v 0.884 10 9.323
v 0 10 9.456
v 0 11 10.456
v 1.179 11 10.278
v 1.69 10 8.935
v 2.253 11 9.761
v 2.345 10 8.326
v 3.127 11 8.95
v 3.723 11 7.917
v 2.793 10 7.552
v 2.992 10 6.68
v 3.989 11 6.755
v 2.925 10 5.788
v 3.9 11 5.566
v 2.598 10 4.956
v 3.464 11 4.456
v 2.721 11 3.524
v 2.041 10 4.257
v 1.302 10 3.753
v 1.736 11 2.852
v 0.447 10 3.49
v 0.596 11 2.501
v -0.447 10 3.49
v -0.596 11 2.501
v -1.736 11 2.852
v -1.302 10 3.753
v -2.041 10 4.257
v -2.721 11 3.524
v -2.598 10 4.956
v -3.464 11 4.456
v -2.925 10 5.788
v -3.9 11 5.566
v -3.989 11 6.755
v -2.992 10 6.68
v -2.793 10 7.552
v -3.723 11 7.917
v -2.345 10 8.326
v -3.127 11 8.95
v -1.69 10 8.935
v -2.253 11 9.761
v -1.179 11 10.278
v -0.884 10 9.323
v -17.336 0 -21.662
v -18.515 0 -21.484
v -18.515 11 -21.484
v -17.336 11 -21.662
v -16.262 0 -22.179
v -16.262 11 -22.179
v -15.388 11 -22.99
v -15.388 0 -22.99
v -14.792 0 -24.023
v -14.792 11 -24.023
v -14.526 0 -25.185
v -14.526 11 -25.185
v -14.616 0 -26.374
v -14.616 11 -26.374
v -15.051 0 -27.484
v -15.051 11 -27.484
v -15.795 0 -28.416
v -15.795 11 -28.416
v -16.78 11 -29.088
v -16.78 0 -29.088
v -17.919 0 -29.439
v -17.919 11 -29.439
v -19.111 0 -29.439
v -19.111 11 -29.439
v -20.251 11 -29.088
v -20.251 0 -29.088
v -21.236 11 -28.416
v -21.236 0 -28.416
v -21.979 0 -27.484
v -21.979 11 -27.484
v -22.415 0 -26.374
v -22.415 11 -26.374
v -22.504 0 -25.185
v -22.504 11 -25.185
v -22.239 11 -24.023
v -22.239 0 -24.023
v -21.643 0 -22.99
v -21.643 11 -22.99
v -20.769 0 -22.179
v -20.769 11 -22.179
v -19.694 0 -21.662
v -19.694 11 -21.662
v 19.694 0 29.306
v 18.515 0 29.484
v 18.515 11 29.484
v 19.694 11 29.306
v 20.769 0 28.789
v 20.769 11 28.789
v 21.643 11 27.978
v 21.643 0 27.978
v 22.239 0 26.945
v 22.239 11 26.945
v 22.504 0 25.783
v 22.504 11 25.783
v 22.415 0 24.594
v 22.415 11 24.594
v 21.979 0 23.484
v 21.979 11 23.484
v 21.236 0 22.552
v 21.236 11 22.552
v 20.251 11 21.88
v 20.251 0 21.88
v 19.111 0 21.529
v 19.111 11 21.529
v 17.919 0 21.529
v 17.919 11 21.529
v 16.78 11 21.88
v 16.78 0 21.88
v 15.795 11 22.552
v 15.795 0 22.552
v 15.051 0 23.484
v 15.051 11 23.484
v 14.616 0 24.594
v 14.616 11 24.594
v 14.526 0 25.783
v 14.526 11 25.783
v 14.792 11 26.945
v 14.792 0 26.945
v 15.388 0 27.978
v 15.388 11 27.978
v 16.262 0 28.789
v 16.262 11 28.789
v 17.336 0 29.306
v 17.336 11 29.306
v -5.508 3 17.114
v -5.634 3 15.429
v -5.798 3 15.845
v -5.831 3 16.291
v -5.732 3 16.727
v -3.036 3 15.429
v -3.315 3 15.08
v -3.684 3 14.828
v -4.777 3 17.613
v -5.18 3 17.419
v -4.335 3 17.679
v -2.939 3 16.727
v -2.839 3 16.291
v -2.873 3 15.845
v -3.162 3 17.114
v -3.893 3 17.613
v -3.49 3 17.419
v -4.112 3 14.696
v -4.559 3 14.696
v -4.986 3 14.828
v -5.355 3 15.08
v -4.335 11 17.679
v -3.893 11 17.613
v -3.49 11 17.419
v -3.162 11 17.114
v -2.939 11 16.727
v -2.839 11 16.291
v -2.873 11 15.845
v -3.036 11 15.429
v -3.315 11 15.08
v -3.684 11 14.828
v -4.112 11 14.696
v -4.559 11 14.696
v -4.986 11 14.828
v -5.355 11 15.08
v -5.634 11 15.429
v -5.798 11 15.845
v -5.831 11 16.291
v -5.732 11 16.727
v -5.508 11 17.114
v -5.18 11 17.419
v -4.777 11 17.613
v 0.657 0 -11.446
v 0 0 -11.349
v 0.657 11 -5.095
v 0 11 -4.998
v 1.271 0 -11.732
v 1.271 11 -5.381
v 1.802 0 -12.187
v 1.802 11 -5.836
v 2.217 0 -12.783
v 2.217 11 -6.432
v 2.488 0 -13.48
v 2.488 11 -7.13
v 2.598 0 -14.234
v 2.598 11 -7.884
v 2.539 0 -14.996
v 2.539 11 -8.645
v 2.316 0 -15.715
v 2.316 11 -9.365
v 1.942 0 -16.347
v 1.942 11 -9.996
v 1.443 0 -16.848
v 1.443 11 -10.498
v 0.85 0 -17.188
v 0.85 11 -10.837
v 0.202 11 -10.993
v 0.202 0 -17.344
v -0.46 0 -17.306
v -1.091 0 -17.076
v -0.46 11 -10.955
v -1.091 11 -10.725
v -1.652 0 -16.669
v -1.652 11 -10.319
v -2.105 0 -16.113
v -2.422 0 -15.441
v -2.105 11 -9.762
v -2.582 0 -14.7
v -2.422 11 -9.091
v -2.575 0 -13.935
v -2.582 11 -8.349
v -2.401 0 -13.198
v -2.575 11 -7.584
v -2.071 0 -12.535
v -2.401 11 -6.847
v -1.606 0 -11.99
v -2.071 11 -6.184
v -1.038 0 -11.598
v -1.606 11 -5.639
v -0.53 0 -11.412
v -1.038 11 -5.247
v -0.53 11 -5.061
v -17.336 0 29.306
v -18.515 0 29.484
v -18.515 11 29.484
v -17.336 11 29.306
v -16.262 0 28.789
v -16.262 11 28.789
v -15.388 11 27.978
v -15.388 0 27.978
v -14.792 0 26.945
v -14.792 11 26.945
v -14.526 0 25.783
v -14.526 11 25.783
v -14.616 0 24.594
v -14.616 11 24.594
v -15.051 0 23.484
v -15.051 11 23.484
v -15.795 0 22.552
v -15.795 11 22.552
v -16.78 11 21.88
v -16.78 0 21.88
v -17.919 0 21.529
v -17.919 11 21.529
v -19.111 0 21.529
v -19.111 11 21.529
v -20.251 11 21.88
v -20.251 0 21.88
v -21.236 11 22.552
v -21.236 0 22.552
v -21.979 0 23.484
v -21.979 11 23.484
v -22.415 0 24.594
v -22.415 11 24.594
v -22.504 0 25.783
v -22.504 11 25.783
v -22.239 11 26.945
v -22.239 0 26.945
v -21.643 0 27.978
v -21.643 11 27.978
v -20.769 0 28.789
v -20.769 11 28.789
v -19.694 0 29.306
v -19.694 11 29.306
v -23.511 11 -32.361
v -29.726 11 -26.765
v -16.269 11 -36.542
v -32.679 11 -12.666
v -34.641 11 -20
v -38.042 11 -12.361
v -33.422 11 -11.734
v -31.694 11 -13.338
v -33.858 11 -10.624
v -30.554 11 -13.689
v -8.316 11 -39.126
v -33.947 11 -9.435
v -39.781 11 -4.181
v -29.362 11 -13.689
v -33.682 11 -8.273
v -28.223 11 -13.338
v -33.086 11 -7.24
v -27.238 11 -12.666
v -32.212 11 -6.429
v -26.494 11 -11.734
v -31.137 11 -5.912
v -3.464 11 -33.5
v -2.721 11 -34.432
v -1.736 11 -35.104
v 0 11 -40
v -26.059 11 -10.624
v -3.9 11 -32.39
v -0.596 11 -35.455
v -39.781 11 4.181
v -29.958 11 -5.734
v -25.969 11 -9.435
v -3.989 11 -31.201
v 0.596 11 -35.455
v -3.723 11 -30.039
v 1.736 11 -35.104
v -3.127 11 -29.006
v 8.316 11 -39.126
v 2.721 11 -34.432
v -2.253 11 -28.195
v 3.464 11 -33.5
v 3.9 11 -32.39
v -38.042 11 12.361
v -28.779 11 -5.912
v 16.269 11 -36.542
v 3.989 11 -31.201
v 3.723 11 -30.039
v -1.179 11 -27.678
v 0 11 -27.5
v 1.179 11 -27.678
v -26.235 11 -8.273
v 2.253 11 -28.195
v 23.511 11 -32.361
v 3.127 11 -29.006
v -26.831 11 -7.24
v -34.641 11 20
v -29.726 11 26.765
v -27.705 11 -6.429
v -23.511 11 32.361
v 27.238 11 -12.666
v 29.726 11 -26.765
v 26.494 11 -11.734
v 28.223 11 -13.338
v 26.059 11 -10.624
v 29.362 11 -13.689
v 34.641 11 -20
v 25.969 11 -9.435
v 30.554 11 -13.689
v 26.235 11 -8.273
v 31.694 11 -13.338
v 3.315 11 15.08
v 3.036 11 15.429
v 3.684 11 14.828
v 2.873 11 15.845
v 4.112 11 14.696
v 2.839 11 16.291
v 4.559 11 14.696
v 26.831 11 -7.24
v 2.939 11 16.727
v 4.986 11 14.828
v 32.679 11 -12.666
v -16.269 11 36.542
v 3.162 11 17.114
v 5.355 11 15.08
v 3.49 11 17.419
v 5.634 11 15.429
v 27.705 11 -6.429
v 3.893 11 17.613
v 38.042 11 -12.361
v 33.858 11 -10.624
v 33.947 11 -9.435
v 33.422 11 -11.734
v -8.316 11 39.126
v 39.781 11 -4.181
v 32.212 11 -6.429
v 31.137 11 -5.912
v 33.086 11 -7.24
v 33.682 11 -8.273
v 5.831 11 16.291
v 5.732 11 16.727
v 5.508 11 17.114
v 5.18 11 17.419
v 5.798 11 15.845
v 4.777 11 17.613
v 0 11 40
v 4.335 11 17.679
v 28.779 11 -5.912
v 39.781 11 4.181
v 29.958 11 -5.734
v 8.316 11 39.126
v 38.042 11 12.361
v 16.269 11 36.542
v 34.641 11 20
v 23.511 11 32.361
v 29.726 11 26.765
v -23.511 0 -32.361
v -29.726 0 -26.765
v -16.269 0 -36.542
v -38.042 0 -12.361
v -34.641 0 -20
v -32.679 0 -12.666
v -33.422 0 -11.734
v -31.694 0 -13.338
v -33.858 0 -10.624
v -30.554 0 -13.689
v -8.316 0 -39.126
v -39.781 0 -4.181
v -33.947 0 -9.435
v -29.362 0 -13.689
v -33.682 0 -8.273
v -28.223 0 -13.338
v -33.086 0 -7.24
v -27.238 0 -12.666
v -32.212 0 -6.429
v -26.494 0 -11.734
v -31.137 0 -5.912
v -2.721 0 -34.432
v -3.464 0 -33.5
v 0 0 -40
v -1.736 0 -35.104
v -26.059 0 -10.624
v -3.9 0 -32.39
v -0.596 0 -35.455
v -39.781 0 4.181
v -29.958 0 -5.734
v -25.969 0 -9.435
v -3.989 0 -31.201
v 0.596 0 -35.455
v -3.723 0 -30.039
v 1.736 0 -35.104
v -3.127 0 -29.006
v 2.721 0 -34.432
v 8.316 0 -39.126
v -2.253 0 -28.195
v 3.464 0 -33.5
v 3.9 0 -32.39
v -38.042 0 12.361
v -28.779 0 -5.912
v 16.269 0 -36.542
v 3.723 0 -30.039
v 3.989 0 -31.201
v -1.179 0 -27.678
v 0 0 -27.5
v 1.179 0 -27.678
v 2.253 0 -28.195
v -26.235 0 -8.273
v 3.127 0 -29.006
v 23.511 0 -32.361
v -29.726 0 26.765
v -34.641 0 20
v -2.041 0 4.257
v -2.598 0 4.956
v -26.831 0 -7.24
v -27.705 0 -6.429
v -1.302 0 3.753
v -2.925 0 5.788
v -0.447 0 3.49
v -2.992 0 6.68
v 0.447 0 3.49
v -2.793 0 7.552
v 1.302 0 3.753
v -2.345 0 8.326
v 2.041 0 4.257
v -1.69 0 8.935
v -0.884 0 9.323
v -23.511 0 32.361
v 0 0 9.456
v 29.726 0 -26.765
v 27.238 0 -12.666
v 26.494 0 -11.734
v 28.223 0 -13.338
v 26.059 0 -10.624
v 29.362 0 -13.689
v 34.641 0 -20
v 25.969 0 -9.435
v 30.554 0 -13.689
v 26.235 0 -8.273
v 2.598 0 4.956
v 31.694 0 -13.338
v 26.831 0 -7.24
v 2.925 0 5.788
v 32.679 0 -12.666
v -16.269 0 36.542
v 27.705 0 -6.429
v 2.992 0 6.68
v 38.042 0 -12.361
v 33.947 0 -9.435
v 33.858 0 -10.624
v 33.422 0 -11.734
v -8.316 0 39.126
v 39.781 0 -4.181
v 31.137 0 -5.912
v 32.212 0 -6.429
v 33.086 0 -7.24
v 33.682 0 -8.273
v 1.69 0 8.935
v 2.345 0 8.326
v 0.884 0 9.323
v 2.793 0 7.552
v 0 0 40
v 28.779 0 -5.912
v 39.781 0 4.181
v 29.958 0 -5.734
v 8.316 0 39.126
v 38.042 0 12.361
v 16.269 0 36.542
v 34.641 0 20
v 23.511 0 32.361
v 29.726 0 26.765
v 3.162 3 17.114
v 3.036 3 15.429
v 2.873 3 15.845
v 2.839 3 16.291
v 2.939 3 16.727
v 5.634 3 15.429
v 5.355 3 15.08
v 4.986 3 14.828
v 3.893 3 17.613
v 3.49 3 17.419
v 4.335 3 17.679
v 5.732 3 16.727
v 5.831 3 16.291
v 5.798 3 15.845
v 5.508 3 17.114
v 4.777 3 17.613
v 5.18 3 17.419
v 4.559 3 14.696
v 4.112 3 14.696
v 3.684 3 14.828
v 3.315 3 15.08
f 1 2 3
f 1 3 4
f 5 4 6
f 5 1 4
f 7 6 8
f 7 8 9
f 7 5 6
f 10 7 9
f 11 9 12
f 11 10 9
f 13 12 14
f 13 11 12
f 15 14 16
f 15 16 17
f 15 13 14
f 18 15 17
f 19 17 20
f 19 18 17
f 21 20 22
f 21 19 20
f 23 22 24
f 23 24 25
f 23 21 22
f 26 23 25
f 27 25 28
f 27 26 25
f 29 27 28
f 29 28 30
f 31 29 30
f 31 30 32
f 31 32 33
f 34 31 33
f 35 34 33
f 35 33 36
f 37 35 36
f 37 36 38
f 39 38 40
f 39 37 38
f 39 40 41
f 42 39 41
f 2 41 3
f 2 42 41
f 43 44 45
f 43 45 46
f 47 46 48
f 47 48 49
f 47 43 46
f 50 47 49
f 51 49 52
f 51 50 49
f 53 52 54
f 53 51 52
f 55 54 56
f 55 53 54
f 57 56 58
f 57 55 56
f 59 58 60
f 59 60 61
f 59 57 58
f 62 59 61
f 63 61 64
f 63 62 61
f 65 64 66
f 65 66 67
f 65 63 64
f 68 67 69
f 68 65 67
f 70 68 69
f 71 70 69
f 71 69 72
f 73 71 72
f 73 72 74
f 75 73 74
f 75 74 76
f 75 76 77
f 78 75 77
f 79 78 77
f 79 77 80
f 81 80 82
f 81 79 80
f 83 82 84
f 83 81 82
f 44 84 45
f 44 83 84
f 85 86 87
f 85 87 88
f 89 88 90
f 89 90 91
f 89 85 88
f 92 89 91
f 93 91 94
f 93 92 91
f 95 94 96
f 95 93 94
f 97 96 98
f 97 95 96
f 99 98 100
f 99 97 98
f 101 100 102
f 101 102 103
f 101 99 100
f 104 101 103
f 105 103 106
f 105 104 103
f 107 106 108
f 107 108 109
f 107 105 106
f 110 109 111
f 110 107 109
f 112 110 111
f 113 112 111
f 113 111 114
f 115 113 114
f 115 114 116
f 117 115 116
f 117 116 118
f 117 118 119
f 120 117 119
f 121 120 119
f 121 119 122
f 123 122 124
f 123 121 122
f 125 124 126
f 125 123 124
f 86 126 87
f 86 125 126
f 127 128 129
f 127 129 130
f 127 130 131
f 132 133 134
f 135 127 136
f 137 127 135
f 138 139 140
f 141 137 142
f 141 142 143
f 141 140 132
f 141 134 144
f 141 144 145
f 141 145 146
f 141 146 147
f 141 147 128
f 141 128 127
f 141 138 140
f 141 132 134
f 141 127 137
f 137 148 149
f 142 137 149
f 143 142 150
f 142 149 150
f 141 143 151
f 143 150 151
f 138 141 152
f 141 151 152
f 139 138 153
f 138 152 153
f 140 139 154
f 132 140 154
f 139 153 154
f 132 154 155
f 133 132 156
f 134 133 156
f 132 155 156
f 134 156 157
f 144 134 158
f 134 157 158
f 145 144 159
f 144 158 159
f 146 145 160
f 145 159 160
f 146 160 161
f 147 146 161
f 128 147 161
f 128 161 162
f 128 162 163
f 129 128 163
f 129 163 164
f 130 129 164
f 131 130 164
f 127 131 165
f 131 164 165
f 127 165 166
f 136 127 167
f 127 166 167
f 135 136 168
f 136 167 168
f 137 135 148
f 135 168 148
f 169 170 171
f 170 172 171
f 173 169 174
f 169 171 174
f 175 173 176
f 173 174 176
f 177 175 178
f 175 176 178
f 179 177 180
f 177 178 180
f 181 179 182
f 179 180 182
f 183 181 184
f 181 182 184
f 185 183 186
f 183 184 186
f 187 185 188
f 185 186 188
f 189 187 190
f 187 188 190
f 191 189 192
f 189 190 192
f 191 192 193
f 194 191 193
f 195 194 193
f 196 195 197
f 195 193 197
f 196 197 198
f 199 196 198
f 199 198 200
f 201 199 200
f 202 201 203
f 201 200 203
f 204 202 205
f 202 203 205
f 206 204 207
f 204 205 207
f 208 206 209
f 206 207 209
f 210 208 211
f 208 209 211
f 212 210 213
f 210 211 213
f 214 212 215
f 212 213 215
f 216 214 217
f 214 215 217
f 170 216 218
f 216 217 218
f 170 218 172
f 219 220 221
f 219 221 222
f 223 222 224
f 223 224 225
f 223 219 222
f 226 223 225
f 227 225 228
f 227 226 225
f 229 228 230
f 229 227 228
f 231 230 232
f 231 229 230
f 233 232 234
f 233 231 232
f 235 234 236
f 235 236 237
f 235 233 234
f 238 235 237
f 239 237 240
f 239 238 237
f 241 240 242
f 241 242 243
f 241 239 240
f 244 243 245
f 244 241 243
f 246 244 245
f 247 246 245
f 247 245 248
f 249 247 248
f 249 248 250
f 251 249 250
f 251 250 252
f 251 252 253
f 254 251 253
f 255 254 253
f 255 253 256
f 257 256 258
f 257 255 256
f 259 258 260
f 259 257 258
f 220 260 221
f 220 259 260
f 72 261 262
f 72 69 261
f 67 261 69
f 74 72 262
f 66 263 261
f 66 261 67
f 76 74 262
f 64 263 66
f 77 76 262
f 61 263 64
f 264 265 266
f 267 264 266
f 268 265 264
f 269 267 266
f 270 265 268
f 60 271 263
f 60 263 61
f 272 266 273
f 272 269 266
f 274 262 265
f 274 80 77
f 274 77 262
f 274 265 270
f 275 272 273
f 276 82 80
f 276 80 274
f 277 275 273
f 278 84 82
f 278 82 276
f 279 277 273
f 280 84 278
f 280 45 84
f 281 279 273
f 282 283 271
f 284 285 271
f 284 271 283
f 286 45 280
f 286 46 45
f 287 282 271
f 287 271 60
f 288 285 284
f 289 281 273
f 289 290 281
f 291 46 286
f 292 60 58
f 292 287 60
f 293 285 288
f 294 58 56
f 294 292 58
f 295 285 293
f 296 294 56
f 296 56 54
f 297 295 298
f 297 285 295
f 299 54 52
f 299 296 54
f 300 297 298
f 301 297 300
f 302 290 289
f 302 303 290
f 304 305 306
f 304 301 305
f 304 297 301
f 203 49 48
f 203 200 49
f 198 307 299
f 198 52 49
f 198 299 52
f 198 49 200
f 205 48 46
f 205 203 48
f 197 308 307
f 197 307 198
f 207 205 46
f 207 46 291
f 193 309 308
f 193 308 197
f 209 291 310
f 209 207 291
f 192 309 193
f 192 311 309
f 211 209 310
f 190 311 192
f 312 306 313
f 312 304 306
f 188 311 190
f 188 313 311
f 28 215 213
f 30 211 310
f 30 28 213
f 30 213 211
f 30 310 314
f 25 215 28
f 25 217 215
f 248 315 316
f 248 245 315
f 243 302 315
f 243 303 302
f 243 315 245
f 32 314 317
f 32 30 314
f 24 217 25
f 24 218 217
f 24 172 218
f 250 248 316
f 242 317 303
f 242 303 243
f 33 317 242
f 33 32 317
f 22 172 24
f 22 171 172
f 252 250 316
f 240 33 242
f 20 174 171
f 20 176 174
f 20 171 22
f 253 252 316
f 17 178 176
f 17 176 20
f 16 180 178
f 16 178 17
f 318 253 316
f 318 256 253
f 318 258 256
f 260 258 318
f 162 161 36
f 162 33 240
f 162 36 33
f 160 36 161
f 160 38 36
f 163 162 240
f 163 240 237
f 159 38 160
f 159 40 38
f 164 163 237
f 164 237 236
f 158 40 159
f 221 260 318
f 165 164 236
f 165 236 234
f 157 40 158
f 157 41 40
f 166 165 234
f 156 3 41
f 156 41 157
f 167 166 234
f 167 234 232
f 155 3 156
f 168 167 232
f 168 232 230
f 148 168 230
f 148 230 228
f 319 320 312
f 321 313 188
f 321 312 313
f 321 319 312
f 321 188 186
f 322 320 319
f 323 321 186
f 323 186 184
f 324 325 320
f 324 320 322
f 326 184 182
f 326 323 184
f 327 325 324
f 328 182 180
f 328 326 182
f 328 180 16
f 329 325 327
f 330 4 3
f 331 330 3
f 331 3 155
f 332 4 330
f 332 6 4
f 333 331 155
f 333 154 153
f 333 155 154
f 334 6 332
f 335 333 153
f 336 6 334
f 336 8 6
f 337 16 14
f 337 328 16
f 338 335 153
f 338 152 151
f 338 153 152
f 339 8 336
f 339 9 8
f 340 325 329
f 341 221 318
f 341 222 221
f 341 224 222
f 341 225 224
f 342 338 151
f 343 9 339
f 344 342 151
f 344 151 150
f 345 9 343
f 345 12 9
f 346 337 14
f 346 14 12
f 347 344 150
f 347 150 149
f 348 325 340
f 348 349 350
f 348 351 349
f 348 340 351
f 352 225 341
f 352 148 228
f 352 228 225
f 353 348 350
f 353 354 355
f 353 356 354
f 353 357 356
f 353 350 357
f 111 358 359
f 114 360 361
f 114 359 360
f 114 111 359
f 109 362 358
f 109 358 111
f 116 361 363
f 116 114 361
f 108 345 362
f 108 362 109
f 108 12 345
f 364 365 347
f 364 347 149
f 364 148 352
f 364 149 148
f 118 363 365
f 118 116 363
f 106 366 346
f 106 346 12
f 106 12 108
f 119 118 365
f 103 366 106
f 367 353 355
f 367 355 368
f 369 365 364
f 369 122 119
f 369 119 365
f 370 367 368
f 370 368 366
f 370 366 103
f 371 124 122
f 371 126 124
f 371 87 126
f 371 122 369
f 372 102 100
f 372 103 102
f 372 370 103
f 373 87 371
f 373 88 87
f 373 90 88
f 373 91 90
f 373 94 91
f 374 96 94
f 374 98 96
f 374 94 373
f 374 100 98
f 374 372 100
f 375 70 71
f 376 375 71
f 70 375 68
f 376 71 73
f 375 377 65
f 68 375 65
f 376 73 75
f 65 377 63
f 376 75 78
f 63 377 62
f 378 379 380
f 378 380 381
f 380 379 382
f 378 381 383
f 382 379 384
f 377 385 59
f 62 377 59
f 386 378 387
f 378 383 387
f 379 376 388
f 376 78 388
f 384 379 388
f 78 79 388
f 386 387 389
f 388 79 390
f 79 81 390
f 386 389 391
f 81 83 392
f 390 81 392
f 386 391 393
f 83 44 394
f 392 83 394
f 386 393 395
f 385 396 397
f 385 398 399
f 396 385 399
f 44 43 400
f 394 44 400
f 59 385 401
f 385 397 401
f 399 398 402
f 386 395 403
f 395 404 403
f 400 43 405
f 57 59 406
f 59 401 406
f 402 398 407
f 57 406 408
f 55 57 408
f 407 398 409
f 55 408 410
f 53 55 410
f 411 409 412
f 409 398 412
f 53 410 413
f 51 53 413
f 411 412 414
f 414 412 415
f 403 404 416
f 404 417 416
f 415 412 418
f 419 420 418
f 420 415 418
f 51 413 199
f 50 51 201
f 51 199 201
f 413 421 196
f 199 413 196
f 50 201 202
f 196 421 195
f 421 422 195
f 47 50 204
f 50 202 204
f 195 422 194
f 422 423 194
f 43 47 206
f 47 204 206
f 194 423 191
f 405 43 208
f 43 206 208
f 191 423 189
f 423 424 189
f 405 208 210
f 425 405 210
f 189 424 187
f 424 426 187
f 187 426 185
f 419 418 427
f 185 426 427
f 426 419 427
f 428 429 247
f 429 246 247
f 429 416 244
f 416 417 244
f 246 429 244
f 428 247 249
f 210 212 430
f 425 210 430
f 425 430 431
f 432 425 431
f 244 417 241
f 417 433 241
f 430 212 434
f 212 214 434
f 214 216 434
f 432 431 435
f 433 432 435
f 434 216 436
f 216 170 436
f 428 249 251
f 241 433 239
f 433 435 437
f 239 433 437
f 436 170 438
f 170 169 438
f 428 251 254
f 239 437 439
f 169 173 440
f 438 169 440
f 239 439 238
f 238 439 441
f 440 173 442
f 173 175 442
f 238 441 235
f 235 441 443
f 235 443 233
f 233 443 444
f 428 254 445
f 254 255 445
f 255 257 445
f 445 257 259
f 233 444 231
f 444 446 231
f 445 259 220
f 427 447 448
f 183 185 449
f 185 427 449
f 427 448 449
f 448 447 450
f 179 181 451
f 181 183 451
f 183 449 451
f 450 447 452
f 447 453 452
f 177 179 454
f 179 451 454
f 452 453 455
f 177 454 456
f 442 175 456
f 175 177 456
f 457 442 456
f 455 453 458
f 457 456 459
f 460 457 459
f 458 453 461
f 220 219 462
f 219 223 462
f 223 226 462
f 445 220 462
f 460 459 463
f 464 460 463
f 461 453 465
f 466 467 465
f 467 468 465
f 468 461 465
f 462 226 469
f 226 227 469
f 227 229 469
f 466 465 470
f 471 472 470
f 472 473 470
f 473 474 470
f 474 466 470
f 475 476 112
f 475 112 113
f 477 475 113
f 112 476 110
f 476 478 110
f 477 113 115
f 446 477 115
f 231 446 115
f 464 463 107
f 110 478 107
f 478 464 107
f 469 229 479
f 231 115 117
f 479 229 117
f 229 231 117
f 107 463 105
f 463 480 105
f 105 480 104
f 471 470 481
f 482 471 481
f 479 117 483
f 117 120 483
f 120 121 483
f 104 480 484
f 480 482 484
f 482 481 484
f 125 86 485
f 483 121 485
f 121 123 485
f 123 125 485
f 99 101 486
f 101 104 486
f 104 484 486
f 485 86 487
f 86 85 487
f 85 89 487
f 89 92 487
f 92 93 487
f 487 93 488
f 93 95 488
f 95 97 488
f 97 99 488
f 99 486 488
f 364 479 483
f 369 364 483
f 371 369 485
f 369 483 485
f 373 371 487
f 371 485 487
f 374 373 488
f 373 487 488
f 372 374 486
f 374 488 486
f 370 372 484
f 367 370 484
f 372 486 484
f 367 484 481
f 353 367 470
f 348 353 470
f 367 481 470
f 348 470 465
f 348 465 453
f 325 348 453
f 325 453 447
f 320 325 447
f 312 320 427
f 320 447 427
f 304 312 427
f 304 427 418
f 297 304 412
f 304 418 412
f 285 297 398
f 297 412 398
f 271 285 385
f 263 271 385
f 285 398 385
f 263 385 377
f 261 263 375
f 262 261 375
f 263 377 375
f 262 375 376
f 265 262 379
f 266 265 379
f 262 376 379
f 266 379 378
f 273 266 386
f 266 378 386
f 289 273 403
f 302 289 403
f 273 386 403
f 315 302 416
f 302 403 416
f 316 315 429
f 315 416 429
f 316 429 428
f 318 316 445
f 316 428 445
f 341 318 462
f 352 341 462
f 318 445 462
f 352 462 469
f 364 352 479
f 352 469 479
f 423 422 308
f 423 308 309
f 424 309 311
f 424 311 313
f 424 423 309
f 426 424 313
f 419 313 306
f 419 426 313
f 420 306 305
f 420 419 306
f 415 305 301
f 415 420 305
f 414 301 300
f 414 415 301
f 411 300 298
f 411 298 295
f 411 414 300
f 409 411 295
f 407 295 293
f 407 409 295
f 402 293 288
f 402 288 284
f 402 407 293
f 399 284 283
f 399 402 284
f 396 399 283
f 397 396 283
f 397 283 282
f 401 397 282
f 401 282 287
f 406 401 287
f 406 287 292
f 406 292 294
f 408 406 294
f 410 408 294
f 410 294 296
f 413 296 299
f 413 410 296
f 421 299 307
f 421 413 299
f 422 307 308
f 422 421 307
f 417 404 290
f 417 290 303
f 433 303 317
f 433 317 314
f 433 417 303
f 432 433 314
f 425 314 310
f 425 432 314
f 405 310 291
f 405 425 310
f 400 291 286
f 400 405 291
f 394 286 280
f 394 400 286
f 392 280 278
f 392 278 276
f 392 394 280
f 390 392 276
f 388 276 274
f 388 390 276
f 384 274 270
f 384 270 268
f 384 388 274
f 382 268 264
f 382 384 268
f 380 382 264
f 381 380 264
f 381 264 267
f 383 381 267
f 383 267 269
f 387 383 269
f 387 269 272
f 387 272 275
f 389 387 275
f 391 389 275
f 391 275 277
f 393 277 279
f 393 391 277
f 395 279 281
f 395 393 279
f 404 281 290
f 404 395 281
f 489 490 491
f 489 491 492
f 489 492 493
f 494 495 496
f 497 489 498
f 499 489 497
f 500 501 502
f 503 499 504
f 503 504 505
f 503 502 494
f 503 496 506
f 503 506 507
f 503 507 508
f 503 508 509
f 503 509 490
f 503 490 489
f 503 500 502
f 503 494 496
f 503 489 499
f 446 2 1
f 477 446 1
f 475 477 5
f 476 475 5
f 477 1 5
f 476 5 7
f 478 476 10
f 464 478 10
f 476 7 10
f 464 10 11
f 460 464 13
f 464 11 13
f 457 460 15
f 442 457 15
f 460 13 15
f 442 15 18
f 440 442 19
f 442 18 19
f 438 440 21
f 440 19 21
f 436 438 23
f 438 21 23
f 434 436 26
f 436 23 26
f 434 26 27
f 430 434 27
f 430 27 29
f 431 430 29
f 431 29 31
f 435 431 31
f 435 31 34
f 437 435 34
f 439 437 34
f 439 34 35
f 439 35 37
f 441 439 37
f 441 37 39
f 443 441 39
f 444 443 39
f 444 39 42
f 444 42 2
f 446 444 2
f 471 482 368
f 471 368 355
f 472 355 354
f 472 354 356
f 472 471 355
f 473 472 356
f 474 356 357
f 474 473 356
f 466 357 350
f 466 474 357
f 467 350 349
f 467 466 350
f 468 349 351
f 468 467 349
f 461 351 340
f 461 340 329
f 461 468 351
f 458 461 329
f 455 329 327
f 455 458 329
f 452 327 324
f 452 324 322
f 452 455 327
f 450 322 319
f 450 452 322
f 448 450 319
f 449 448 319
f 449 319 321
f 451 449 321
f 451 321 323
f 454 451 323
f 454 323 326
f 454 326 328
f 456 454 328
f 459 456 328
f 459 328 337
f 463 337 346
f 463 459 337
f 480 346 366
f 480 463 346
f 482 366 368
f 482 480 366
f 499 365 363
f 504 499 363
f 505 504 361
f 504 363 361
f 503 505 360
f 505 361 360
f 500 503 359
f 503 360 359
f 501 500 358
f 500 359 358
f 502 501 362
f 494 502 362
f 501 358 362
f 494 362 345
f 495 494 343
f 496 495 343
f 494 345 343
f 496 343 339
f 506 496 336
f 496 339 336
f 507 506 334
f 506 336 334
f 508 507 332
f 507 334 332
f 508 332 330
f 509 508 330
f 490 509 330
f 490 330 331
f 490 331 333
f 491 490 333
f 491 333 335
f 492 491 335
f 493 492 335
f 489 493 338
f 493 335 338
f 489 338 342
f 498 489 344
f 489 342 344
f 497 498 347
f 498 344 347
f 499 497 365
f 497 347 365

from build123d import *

# Parameters (mm, degrees)
SKETCH_1_R          = 40
SKETCH_1_R_2        = 4
EXTRUDE_1_DEPTH     = 11
SKETCH_3_R          = 3
CUT_EXTRUDE_1_DEPTH = 58.628118137
CHAMFER_1_SIZE      = 1
SKETCH_6_R          = 2.6
CUT_EXTRUDE_2_DEPTH = 10
SKETCH_7_R          = 1.5
CUT_EXTRUDE_3_DEPTH = 8


with BuildPart() as part:
    # 草图1 → 凸台-拉伸1 (new body)
    with BuildSketch(Plane(origin=(0, 0, 0), x_dir=(1, 0, 0), z_dir=(0, 1, 0))):
        Circle(SKETCH_1_R)
        with Locations((0, 31.5)):
            Circle(SKETCH_1_R_2, mode=Mode.SUBTRACT)
        with Locations((29.958280263, 9.734035323)):
            Circle(SKETCH_1_R_2, mode=Mode.SUBTRACT)
        with Locations((18.515235447, -25.484035323)):
            Circle(SKETCH_1_R_2, mode=Mode.SUBTRACT)
        with Locations((-18.515235447, -25.484035323)):
            Circle(SKETCH_1_R_2, mode=Mode.SUBTRACT)
        with Locations((-29.958280263, 9.734035323)):
            Circle(SKETCH_1_R_2, mode=Mode.SUBTRACT)
        with Locations((-18.515235447, 25.484035323)):
            Circle(SKETCH_1_R_2, mode=Mode.SUBTRACT)
    extrude(amount=EXTRUDE_1_DEPTH)

    # 草图3 → 切除-拉伸1 (cut, through all)
    with BuildSketch(Plane(origin=(0, 11, 0), x_dir=(1, 0, 0), z_dir=(0, 1, 0))):
        with Locations((0, -6.456029322)):
            Circle(SKETCH_3_R)
    extrude(amount=-CUT_EXTRUDE_1_DEPTH, mode=Mode.SUBTRACT)

    # 倒角1
    chamfer_1_edges = [part.edges().sort_by_distance(p)[0] for p in [
        (-3, 11, 6.456029322),
    ]]
    chamfer(chamfer_1_edges, length=CHAMFER_1_SIZE)

    # 草图6 → 切除-拉伸2 (cut, symmetric)
    with BuildSketch(Plane(origin=(0, 0, 0), x_dir=(1, 0, 0), z_dir=(0, 0.8660254037844398, 0.499999999999998))):
        with Locations((0, 12.42820323)):
            Circle(SKETCH_6_R)
    extrude(amount=CUT_EXTRUDE_2_DEPTH, both=True, mode=Mode.SUBTRACT)

    # 草图7 → 切除-拉伸3 (cut)
    with BuildSketch(Plane(origin=(0, 11, 0), x_dir=(1, 0, 0), z_dir=(0, 1, 0))):
        with Locations((-4.335219005, -16.17925759)):
            Circle(SKETCH_7_R)
        with Locations((4.335219005, -16.17925759)):
            Circle(SKETCH_7_R)
    extrude(amount=-CUT_EXTRUDE_3_DEPTH, mode=Mode.SUBTRACT)


solid = part.part
